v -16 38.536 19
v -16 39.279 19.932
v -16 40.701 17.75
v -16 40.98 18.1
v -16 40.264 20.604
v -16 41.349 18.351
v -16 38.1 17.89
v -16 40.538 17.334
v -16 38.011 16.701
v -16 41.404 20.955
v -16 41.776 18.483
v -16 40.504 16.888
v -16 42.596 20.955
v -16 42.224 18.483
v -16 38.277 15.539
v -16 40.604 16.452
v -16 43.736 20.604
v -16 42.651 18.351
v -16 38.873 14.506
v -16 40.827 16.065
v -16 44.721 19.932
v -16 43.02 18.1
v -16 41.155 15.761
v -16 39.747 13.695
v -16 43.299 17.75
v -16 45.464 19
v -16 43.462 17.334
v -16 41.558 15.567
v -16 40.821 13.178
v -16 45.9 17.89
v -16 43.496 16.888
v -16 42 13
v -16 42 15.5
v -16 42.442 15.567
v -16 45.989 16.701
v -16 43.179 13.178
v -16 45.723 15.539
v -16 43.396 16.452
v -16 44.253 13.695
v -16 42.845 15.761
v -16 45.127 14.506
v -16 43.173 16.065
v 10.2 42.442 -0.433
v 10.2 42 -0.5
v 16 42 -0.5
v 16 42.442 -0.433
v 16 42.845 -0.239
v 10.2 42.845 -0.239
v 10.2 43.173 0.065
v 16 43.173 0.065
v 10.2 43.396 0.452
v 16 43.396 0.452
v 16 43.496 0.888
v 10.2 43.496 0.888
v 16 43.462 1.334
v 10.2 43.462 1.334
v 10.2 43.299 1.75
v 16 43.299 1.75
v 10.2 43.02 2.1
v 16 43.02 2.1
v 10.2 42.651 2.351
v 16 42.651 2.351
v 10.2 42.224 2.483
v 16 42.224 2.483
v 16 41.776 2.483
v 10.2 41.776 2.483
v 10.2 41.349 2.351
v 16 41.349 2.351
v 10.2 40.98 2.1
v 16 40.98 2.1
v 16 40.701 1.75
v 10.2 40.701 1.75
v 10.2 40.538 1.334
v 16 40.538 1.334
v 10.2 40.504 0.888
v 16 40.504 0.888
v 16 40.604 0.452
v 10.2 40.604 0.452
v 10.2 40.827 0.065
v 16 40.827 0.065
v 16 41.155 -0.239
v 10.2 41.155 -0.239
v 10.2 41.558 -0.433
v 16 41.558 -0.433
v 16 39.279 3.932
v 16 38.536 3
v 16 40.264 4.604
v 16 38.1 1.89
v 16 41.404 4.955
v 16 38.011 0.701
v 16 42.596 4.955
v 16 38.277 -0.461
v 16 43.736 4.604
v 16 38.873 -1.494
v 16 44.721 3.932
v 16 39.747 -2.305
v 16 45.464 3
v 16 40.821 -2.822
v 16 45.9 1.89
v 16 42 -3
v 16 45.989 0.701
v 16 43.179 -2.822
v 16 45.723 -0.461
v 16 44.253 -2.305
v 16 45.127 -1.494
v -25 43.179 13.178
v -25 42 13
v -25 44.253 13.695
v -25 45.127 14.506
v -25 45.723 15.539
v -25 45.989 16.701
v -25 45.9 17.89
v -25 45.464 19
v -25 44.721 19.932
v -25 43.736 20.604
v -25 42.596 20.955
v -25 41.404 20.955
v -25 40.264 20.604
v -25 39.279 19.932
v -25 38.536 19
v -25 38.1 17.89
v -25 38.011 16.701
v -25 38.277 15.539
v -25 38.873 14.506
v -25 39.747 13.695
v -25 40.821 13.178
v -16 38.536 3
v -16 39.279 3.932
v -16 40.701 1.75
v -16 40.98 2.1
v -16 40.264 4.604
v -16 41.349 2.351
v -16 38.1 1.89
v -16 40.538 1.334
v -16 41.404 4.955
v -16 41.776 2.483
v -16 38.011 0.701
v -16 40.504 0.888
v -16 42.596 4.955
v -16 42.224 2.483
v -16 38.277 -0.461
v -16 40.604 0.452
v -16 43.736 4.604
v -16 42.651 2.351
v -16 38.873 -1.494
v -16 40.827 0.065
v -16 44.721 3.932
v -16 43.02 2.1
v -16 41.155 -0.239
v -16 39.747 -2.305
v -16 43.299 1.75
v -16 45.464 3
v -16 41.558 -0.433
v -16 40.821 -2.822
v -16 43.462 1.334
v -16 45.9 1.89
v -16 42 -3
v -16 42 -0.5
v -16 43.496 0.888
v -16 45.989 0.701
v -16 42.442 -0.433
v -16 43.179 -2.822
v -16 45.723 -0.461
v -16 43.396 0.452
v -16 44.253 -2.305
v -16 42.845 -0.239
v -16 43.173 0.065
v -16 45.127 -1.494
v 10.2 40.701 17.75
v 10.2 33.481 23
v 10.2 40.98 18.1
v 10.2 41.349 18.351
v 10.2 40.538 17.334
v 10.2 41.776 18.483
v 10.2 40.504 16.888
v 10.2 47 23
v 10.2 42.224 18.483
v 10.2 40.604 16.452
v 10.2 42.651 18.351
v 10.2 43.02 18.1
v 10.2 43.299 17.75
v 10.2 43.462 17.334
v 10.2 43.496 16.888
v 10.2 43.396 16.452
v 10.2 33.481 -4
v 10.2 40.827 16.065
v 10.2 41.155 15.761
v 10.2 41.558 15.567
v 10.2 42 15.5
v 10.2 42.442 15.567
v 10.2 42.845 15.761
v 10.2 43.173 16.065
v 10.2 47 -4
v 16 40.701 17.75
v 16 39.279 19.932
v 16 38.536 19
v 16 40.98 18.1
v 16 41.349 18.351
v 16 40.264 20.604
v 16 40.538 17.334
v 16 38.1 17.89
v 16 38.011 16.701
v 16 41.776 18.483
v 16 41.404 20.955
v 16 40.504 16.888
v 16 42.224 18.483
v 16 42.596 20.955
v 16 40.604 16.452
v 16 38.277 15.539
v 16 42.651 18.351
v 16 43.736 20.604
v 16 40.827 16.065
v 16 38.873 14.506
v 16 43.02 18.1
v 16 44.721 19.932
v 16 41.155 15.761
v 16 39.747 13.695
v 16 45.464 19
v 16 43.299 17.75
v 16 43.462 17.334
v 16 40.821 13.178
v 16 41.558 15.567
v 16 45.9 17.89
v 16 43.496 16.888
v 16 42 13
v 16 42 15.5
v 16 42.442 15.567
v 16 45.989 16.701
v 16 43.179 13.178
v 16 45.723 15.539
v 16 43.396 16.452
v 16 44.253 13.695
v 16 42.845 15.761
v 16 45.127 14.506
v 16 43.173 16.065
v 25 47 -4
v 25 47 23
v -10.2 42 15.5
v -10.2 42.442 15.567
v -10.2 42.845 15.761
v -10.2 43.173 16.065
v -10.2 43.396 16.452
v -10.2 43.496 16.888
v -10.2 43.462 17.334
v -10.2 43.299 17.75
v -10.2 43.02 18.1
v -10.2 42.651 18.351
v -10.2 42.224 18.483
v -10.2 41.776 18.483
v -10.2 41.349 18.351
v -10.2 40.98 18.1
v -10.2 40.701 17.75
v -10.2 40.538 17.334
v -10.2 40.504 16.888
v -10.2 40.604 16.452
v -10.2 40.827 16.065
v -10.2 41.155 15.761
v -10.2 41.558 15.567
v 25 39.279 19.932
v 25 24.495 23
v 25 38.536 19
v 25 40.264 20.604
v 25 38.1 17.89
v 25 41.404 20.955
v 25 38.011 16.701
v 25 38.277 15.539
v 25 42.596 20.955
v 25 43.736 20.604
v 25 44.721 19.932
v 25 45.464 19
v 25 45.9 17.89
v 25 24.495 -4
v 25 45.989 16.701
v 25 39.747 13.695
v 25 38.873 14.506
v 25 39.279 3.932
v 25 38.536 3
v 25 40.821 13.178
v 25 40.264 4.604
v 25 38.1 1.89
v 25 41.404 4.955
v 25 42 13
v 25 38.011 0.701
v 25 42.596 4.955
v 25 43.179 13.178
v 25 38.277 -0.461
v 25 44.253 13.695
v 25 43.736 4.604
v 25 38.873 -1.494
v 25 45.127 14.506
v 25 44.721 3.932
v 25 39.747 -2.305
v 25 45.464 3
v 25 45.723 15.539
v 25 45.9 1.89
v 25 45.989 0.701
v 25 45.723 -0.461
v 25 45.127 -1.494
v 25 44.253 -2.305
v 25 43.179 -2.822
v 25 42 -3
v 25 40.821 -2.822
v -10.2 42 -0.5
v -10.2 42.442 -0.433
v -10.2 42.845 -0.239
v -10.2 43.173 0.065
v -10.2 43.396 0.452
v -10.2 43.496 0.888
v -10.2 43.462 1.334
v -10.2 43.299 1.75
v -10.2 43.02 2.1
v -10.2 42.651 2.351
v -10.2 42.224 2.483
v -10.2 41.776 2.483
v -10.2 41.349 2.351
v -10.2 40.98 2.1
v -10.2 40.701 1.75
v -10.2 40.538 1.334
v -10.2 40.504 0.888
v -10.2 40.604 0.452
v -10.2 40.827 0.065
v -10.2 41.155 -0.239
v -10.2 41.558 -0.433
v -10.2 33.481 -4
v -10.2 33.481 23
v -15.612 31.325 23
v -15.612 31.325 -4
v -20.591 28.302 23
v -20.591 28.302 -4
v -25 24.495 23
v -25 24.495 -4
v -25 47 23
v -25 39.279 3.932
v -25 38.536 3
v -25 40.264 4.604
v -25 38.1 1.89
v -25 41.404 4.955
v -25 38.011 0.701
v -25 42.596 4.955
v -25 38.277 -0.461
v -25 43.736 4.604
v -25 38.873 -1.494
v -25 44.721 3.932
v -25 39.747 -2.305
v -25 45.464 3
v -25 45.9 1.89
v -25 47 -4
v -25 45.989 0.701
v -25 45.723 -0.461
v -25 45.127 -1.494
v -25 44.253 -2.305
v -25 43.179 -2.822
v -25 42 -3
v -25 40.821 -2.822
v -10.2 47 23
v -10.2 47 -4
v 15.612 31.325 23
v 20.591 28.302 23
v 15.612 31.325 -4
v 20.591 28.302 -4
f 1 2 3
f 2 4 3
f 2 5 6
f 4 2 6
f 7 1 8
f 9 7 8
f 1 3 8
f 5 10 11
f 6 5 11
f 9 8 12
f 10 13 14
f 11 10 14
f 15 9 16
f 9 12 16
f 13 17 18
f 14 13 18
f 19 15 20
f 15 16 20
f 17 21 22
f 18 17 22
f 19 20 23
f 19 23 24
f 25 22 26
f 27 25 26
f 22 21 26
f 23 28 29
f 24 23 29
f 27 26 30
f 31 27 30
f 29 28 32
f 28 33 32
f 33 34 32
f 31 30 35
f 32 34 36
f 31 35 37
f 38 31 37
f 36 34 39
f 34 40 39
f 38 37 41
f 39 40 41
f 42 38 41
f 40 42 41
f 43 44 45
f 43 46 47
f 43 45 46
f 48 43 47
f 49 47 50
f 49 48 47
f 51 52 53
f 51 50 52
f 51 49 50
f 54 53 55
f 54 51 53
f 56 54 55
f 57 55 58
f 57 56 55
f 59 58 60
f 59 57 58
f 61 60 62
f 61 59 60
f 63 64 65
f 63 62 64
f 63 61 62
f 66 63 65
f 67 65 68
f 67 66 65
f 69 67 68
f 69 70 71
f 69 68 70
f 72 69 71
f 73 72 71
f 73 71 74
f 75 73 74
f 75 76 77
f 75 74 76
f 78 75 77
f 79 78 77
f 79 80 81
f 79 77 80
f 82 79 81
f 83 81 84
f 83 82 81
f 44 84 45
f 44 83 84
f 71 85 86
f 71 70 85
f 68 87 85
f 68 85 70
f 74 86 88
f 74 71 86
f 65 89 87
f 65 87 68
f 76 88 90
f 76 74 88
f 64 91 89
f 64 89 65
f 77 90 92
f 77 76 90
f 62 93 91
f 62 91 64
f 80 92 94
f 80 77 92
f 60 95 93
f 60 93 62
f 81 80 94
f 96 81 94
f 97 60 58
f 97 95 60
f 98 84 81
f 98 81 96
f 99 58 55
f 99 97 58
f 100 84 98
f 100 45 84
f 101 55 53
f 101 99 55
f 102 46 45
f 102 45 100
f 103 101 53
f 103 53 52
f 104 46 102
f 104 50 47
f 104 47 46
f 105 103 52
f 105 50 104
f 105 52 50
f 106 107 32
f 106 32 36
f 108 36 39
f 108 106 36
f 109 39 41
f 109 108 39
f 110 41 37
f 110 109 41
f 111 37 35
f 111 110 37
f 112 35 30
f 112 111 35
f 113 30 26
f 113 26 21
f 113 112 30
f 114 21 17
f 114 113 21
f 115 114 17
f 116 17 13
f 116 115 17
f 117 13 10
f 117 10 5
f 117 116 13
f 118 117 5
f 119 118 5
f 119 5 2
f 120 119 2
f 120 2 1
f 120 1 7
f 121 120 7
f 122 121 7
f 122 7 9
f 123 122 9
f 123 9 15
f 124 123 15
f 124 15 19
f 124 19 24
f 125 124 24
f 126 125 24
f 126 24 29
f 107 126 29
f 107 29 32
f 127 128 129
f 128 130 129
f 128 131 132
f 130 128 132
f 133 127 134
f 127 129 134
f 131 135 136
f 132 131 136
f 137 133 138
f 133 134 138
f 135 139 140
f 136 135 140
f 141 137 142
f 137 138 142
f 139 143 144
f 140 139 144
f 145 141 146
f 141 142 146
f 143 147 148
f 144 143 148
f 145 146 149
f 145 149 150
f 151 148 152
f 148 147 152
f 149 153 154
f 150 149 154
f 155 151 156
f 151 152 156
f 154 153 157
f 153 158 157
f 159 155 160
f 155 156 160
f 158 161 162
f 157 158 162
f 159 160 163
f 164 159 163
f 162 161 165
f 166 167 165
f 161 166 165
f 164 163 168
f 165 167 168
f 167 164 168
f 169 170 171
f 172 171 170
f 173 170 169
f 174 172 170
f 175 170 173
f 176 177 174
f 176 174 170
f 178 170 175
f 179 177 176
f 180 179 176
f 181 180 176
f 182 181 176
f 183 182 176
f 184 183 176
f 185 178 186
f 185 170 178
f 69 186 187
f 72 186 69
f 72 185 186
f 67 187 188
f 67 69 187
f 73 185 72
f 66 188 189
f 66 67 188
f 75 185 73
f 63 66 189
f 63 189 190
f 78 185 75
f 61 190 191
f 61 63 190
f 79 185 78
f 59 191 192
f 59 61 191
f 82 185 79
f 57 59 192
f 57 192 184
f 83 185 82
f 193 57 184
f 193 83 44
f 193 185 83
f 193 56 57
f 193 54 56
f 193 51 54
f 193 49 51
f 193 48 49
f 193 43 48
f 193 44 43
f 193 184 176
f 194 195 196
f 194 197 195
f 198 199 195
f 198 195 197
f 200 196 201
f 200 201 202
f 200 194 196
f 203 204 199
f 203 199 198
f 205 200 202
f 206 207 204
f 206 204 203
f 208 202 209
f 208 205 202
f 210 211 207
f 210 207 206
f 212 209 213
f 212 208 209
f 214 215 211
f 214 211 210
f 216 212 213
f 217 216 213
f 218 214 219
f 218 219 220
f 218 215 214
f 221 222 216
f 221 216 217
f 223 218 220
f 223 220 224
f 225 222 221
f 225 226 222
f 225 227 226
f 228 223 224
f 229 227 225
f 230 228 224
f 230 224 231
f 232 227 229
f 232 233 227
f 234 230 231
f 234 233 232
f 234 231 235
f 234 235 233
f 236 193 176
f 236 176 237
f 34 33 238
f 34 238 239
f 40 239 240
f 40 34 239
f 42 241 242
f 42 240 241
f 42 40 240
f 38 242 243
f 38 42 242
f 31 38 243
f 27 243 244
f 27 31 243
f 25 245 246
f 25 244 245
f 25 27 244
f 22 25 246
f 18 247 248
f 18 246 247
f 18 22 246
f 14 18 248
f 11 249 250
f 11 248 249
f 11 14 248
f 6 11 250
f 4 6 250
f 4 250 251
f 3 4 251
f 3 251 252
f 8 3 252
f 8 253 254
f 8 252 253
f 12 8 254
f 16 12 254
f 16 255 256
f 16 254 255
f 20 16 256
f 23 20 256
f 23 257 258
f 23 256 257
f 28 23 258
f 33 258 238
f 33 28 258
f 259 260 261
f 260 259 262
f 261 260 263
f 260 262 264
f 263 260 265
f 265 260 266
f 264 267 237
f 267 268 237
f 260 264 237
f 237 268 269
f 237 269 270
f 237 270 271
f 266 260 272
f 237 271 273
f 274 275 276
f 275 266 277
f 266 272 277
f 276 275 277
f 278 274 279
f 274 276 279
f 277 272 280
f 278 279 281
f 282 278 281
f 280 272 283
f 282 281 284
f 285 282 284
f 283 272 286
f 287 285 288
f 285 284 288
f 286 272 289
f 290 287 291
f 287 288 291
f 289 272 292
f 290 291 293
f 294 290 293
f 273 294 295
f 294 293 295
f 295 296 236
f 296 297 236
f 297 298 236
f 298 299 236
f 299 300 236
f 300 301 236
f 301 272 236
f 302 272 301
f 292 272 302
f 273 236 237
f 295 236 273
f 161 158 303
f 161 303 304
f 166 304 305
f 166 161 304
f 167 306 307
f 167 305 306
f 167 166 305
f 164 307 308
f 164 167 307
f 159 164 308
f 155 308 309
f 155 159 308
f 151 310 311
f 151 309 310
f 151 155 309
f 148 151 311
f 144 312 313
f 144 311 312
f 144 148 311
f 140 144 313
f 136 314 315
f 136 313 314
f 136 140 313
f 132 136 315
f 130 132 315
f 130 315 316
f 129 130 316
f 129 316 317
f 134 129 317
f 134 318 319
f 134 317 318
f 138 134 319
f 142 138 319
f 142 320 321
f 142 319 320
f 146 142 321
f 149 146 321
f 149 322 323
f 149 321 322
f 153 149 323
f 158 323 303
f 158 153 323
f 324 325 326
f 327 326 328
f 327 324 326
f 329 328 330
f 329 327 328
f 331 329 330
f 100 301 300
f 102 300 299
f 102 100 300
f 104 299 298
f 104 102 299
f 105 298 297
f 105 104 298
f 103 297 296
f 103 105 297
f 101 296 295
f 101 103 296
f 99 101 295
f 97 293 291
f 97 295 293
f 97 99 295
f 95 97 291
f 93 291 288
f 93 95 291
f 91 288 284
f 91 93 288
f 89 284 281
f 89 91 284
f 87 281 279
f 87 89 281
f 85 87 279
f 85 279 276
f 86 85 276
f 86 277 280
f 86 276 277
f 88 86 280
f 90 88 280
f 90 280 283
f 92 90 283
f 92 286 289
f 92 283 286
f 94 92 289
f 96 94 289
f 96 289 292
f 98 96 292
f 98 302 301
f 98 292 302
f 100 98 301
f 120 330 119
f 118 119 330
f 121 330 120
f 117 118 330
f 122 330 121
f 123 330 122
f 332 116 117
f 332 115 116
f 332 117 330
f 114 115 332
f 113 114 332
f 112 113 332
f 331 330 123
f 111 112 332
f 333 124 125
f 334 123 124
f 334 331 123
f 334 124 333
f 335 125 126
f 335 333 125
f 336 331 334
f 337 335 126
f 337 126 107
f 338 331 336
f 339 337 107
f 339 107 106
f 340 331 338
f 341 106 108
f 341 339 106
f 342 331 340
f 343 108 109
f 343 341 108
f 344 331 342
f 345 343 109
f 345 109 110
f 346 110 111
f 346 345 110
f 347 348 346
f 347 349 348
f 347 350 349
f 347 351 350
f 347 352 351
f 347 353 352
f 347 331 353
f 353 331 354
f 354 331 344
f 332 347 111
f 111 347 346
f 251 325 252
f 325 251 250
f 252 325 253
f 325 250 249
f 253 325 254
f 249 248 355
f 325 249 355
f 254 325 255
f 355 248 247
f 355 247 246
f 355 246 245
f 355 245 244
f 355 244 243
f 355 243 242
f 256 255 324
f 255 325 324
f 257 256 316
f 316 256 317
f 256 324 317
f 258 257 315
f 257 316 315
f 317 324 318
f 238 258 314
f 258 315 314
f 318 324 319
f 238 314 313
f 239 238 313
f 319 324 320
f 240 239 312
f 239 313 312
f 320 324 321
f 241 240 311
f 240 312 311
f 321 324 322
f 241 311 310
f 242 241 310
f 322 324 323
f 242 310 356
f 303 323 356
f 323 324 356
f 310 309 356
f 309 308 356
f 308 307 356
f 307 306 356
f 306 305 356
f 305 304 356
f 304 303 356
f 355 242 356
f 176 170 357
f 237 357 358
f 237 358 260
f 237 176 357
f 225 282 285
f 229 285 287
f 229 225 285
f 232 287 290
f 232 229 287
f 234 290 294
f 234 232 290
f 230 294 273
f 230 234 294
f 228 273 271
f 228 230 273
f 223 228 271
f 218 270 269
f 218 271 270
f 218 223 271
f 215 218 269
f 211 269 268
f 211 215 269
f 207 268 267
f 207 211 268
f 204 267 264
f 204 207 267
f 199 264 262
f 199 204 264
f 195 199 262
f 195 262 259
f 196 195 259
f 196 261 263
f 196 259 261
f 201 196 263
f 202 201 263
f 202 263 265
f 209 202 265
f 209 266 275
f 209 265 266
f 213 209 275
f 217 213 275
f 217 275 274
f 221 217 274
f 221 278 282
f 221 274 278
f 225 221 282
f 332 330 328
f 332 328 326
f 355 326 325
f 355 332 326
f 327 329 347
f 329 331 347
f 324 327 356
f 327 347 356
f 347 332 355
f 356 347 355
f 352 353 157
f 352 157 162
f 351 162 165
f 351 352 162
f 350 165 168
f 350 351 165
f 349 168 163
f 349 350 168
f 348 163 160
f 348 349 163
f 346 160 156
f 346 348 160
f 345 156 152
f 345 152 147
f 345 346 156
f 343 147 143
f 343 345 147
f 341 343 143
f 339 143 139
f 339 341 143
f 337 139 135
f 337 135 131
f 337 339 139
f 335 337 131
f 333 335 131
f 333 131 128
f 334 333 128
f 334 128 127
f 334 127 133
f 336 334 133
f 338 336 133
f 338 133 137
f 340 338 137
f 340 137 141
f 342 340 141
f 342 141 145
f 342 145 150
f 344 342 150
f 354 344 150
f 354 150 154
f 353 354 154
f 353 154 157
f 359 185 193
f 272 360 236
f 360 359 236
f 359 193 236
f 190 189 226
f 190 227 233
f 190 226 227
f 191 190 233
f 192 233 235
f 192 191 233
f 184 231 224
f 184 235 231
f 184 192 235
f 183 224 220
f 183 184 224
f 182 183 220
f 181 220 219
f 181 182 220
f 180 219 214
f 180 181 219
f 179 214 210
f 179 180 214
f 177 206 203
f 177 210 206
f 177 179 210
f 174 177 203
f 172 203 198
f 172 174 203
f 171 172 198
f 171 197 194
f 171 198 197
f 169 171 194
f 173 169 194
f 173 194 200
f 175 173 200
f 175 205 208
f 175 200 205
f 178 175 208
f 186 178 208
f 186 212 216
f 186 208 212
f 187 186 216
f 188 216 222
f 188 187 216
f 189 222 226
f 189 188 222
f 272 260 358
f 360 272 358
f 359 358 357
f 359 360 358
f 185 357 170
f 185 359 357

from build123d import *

# Parameters (mm, degrees)
CYLINDER1796_R     = 1.5
CYLINDER1796_DEPTH = 64
CYLINDER1795_R     = 1.5
CYLINDER1795_DEPTH = 64
CYLINDER1800_R     = 4
CYLINDER1800_DEPTH = 16
CYLINDER1799_R     = 4
CYLINDER1799_DEPTH = 16
CYLINDER1798_R     = 4
CYLINDER1798_DEPTH = 16
CYLINDER1797_R     = 4
CYLINDER1797_DEPTH = 16
CYLINDER1793_R     = 35
CYLINDER1793_DEPTH = 32
BOX712_W           = 20.4
BOX712_H           = 27
BOX712_DEPTH       = 28
BOX711_W           = 50
BOX711_H           = 32
BOX711_DEPTH       = 27


with BuildPart() as v_lec1796:
    # Cylinder1796 → Cylinder1796 (new body)
    with BuildSketch(Plane(origin=(-32, 42, 17), x_dir=(0, 0, -1), z_dir=(1, 0, 0))):
        Circle(CYLINDER1796_R)
    extrude(amount=CYLINDER1796_DEPTH)


with BuildPart() as compound891:
    # Cylinder1795 → Cylinder1795 (new body)
    with BuildSketch(Plane(origin=(-32, 42, 1), x_dir=(0, 0, -1), z_dir=(1, 0, 0))):
        Circle(CYLINDER1795_R)
    extrude(amount=CYLINDER1795_DEPTH)

    # Compound891: union Válec1796
    add(v_lec1796.part)


with BuildPart() as v_lec1800:
    # Cylinder1800 → Cylinder1800 (new body)
    with BuildSketch(Plane(origin=(16, 42, 17), x_dir=(0, 0, -1), z_dir=(1, 0, 0))):
        Circle(CYLINDER1800_R)
    extrude(amount=CYLINDER1800_DEPTH)


with BuildPart() as v_lec1799:
    # Cylinder1799 → Cylinder1799 (new body)
    with BuildSketch(Plane(origin=(16, 42, 1), x_dir=(0, 0, -1), z_dir=(1, 0, 0))):
        Circle(CYLINDER1799_R)
    extrude(amount=CYLINDER1799_DEPTH)


with BuildPart() as v_lec1798:
    # Cylinder1798 → Cylinder1798 (new body)
    with BuildSketch(Plane(origin=(-32, 42, 17), x_dir=(0, 0, -1), z_dir=(1, 0, 0))):
        Circle(CYLINDER1798_R)
    extrude(amount=CYLINDER1798_DEPTH)


with BuildPart() as compound892:
    # Cylinder1797 → Cylinder1797 (new body)
    with BuildSketch(Plane(origin=(-32, 42, 1), x_dir=(0, 0, -1), z_dir=(1, 0, 0))):
        Circle(CYLINDER1797_R)
    extrude(amount=CYLINDER1797_DEPTH)

    # Compound892: union Válec1800, Válec1799, Válec1798
    add(v_lec1800.part)
    add(v_lec1799.part)
    add(v_lec1798.part)


with BuildPart() as v_lec1793:
    # Cylinder1793 → Cylinder1793 (new body)
    with BuildSketch(Plane.XY.offset(-3)):
        Circle(CYLINDER1793_R)
    extrude(amount=CYLINDER1793_DEPTH)


with BuildPart() as krychle712:
    # Box712 → Box712 (new body)
    with BuildSketch(Plane(origin=(-10.2, 20, -3), x_dir=(1, 0, 0), z_dir=(0, 0, 1))):
        with Locations((10.2, 13.5)):
            Rectangle(BOX712_W, BOX712_H)
    extrude(amount=BOX712_DEPTH)


with BuildPart() as cut529:
    # Box711 → Box711 (new body)
    with BuildSketch(Plane(origin=(-25, 15, -3), x_dir=(1, 0, 0), z_dir=(0, 0, 1))):
        with Locations((25, 16)):
            Rectangle(BOX711_W, BOX711_H)
    extrude(amount=BOX711_DEPTH)

    # Cut524: cut Krychle712
    add(krychle712.part, mode=Mode.SUBTRACT)

    # Cut527: cut Válec1793
    add(v_lec1793.part, mode=Mode.SUBTRACT)


with BuildPart() as cut529_1:
    # Cut527 placement: moved
    add(cut529.part.moved(Location((0, 0, -1))))

    # Cut528: cut Compound892
    add(compound892.part, mode=Mode.SUBTRACT)

    # Cut529: cut Compound891
    add(compound891.part, mode=Mode.SUBTRACT)


solid = cut529_1.part
